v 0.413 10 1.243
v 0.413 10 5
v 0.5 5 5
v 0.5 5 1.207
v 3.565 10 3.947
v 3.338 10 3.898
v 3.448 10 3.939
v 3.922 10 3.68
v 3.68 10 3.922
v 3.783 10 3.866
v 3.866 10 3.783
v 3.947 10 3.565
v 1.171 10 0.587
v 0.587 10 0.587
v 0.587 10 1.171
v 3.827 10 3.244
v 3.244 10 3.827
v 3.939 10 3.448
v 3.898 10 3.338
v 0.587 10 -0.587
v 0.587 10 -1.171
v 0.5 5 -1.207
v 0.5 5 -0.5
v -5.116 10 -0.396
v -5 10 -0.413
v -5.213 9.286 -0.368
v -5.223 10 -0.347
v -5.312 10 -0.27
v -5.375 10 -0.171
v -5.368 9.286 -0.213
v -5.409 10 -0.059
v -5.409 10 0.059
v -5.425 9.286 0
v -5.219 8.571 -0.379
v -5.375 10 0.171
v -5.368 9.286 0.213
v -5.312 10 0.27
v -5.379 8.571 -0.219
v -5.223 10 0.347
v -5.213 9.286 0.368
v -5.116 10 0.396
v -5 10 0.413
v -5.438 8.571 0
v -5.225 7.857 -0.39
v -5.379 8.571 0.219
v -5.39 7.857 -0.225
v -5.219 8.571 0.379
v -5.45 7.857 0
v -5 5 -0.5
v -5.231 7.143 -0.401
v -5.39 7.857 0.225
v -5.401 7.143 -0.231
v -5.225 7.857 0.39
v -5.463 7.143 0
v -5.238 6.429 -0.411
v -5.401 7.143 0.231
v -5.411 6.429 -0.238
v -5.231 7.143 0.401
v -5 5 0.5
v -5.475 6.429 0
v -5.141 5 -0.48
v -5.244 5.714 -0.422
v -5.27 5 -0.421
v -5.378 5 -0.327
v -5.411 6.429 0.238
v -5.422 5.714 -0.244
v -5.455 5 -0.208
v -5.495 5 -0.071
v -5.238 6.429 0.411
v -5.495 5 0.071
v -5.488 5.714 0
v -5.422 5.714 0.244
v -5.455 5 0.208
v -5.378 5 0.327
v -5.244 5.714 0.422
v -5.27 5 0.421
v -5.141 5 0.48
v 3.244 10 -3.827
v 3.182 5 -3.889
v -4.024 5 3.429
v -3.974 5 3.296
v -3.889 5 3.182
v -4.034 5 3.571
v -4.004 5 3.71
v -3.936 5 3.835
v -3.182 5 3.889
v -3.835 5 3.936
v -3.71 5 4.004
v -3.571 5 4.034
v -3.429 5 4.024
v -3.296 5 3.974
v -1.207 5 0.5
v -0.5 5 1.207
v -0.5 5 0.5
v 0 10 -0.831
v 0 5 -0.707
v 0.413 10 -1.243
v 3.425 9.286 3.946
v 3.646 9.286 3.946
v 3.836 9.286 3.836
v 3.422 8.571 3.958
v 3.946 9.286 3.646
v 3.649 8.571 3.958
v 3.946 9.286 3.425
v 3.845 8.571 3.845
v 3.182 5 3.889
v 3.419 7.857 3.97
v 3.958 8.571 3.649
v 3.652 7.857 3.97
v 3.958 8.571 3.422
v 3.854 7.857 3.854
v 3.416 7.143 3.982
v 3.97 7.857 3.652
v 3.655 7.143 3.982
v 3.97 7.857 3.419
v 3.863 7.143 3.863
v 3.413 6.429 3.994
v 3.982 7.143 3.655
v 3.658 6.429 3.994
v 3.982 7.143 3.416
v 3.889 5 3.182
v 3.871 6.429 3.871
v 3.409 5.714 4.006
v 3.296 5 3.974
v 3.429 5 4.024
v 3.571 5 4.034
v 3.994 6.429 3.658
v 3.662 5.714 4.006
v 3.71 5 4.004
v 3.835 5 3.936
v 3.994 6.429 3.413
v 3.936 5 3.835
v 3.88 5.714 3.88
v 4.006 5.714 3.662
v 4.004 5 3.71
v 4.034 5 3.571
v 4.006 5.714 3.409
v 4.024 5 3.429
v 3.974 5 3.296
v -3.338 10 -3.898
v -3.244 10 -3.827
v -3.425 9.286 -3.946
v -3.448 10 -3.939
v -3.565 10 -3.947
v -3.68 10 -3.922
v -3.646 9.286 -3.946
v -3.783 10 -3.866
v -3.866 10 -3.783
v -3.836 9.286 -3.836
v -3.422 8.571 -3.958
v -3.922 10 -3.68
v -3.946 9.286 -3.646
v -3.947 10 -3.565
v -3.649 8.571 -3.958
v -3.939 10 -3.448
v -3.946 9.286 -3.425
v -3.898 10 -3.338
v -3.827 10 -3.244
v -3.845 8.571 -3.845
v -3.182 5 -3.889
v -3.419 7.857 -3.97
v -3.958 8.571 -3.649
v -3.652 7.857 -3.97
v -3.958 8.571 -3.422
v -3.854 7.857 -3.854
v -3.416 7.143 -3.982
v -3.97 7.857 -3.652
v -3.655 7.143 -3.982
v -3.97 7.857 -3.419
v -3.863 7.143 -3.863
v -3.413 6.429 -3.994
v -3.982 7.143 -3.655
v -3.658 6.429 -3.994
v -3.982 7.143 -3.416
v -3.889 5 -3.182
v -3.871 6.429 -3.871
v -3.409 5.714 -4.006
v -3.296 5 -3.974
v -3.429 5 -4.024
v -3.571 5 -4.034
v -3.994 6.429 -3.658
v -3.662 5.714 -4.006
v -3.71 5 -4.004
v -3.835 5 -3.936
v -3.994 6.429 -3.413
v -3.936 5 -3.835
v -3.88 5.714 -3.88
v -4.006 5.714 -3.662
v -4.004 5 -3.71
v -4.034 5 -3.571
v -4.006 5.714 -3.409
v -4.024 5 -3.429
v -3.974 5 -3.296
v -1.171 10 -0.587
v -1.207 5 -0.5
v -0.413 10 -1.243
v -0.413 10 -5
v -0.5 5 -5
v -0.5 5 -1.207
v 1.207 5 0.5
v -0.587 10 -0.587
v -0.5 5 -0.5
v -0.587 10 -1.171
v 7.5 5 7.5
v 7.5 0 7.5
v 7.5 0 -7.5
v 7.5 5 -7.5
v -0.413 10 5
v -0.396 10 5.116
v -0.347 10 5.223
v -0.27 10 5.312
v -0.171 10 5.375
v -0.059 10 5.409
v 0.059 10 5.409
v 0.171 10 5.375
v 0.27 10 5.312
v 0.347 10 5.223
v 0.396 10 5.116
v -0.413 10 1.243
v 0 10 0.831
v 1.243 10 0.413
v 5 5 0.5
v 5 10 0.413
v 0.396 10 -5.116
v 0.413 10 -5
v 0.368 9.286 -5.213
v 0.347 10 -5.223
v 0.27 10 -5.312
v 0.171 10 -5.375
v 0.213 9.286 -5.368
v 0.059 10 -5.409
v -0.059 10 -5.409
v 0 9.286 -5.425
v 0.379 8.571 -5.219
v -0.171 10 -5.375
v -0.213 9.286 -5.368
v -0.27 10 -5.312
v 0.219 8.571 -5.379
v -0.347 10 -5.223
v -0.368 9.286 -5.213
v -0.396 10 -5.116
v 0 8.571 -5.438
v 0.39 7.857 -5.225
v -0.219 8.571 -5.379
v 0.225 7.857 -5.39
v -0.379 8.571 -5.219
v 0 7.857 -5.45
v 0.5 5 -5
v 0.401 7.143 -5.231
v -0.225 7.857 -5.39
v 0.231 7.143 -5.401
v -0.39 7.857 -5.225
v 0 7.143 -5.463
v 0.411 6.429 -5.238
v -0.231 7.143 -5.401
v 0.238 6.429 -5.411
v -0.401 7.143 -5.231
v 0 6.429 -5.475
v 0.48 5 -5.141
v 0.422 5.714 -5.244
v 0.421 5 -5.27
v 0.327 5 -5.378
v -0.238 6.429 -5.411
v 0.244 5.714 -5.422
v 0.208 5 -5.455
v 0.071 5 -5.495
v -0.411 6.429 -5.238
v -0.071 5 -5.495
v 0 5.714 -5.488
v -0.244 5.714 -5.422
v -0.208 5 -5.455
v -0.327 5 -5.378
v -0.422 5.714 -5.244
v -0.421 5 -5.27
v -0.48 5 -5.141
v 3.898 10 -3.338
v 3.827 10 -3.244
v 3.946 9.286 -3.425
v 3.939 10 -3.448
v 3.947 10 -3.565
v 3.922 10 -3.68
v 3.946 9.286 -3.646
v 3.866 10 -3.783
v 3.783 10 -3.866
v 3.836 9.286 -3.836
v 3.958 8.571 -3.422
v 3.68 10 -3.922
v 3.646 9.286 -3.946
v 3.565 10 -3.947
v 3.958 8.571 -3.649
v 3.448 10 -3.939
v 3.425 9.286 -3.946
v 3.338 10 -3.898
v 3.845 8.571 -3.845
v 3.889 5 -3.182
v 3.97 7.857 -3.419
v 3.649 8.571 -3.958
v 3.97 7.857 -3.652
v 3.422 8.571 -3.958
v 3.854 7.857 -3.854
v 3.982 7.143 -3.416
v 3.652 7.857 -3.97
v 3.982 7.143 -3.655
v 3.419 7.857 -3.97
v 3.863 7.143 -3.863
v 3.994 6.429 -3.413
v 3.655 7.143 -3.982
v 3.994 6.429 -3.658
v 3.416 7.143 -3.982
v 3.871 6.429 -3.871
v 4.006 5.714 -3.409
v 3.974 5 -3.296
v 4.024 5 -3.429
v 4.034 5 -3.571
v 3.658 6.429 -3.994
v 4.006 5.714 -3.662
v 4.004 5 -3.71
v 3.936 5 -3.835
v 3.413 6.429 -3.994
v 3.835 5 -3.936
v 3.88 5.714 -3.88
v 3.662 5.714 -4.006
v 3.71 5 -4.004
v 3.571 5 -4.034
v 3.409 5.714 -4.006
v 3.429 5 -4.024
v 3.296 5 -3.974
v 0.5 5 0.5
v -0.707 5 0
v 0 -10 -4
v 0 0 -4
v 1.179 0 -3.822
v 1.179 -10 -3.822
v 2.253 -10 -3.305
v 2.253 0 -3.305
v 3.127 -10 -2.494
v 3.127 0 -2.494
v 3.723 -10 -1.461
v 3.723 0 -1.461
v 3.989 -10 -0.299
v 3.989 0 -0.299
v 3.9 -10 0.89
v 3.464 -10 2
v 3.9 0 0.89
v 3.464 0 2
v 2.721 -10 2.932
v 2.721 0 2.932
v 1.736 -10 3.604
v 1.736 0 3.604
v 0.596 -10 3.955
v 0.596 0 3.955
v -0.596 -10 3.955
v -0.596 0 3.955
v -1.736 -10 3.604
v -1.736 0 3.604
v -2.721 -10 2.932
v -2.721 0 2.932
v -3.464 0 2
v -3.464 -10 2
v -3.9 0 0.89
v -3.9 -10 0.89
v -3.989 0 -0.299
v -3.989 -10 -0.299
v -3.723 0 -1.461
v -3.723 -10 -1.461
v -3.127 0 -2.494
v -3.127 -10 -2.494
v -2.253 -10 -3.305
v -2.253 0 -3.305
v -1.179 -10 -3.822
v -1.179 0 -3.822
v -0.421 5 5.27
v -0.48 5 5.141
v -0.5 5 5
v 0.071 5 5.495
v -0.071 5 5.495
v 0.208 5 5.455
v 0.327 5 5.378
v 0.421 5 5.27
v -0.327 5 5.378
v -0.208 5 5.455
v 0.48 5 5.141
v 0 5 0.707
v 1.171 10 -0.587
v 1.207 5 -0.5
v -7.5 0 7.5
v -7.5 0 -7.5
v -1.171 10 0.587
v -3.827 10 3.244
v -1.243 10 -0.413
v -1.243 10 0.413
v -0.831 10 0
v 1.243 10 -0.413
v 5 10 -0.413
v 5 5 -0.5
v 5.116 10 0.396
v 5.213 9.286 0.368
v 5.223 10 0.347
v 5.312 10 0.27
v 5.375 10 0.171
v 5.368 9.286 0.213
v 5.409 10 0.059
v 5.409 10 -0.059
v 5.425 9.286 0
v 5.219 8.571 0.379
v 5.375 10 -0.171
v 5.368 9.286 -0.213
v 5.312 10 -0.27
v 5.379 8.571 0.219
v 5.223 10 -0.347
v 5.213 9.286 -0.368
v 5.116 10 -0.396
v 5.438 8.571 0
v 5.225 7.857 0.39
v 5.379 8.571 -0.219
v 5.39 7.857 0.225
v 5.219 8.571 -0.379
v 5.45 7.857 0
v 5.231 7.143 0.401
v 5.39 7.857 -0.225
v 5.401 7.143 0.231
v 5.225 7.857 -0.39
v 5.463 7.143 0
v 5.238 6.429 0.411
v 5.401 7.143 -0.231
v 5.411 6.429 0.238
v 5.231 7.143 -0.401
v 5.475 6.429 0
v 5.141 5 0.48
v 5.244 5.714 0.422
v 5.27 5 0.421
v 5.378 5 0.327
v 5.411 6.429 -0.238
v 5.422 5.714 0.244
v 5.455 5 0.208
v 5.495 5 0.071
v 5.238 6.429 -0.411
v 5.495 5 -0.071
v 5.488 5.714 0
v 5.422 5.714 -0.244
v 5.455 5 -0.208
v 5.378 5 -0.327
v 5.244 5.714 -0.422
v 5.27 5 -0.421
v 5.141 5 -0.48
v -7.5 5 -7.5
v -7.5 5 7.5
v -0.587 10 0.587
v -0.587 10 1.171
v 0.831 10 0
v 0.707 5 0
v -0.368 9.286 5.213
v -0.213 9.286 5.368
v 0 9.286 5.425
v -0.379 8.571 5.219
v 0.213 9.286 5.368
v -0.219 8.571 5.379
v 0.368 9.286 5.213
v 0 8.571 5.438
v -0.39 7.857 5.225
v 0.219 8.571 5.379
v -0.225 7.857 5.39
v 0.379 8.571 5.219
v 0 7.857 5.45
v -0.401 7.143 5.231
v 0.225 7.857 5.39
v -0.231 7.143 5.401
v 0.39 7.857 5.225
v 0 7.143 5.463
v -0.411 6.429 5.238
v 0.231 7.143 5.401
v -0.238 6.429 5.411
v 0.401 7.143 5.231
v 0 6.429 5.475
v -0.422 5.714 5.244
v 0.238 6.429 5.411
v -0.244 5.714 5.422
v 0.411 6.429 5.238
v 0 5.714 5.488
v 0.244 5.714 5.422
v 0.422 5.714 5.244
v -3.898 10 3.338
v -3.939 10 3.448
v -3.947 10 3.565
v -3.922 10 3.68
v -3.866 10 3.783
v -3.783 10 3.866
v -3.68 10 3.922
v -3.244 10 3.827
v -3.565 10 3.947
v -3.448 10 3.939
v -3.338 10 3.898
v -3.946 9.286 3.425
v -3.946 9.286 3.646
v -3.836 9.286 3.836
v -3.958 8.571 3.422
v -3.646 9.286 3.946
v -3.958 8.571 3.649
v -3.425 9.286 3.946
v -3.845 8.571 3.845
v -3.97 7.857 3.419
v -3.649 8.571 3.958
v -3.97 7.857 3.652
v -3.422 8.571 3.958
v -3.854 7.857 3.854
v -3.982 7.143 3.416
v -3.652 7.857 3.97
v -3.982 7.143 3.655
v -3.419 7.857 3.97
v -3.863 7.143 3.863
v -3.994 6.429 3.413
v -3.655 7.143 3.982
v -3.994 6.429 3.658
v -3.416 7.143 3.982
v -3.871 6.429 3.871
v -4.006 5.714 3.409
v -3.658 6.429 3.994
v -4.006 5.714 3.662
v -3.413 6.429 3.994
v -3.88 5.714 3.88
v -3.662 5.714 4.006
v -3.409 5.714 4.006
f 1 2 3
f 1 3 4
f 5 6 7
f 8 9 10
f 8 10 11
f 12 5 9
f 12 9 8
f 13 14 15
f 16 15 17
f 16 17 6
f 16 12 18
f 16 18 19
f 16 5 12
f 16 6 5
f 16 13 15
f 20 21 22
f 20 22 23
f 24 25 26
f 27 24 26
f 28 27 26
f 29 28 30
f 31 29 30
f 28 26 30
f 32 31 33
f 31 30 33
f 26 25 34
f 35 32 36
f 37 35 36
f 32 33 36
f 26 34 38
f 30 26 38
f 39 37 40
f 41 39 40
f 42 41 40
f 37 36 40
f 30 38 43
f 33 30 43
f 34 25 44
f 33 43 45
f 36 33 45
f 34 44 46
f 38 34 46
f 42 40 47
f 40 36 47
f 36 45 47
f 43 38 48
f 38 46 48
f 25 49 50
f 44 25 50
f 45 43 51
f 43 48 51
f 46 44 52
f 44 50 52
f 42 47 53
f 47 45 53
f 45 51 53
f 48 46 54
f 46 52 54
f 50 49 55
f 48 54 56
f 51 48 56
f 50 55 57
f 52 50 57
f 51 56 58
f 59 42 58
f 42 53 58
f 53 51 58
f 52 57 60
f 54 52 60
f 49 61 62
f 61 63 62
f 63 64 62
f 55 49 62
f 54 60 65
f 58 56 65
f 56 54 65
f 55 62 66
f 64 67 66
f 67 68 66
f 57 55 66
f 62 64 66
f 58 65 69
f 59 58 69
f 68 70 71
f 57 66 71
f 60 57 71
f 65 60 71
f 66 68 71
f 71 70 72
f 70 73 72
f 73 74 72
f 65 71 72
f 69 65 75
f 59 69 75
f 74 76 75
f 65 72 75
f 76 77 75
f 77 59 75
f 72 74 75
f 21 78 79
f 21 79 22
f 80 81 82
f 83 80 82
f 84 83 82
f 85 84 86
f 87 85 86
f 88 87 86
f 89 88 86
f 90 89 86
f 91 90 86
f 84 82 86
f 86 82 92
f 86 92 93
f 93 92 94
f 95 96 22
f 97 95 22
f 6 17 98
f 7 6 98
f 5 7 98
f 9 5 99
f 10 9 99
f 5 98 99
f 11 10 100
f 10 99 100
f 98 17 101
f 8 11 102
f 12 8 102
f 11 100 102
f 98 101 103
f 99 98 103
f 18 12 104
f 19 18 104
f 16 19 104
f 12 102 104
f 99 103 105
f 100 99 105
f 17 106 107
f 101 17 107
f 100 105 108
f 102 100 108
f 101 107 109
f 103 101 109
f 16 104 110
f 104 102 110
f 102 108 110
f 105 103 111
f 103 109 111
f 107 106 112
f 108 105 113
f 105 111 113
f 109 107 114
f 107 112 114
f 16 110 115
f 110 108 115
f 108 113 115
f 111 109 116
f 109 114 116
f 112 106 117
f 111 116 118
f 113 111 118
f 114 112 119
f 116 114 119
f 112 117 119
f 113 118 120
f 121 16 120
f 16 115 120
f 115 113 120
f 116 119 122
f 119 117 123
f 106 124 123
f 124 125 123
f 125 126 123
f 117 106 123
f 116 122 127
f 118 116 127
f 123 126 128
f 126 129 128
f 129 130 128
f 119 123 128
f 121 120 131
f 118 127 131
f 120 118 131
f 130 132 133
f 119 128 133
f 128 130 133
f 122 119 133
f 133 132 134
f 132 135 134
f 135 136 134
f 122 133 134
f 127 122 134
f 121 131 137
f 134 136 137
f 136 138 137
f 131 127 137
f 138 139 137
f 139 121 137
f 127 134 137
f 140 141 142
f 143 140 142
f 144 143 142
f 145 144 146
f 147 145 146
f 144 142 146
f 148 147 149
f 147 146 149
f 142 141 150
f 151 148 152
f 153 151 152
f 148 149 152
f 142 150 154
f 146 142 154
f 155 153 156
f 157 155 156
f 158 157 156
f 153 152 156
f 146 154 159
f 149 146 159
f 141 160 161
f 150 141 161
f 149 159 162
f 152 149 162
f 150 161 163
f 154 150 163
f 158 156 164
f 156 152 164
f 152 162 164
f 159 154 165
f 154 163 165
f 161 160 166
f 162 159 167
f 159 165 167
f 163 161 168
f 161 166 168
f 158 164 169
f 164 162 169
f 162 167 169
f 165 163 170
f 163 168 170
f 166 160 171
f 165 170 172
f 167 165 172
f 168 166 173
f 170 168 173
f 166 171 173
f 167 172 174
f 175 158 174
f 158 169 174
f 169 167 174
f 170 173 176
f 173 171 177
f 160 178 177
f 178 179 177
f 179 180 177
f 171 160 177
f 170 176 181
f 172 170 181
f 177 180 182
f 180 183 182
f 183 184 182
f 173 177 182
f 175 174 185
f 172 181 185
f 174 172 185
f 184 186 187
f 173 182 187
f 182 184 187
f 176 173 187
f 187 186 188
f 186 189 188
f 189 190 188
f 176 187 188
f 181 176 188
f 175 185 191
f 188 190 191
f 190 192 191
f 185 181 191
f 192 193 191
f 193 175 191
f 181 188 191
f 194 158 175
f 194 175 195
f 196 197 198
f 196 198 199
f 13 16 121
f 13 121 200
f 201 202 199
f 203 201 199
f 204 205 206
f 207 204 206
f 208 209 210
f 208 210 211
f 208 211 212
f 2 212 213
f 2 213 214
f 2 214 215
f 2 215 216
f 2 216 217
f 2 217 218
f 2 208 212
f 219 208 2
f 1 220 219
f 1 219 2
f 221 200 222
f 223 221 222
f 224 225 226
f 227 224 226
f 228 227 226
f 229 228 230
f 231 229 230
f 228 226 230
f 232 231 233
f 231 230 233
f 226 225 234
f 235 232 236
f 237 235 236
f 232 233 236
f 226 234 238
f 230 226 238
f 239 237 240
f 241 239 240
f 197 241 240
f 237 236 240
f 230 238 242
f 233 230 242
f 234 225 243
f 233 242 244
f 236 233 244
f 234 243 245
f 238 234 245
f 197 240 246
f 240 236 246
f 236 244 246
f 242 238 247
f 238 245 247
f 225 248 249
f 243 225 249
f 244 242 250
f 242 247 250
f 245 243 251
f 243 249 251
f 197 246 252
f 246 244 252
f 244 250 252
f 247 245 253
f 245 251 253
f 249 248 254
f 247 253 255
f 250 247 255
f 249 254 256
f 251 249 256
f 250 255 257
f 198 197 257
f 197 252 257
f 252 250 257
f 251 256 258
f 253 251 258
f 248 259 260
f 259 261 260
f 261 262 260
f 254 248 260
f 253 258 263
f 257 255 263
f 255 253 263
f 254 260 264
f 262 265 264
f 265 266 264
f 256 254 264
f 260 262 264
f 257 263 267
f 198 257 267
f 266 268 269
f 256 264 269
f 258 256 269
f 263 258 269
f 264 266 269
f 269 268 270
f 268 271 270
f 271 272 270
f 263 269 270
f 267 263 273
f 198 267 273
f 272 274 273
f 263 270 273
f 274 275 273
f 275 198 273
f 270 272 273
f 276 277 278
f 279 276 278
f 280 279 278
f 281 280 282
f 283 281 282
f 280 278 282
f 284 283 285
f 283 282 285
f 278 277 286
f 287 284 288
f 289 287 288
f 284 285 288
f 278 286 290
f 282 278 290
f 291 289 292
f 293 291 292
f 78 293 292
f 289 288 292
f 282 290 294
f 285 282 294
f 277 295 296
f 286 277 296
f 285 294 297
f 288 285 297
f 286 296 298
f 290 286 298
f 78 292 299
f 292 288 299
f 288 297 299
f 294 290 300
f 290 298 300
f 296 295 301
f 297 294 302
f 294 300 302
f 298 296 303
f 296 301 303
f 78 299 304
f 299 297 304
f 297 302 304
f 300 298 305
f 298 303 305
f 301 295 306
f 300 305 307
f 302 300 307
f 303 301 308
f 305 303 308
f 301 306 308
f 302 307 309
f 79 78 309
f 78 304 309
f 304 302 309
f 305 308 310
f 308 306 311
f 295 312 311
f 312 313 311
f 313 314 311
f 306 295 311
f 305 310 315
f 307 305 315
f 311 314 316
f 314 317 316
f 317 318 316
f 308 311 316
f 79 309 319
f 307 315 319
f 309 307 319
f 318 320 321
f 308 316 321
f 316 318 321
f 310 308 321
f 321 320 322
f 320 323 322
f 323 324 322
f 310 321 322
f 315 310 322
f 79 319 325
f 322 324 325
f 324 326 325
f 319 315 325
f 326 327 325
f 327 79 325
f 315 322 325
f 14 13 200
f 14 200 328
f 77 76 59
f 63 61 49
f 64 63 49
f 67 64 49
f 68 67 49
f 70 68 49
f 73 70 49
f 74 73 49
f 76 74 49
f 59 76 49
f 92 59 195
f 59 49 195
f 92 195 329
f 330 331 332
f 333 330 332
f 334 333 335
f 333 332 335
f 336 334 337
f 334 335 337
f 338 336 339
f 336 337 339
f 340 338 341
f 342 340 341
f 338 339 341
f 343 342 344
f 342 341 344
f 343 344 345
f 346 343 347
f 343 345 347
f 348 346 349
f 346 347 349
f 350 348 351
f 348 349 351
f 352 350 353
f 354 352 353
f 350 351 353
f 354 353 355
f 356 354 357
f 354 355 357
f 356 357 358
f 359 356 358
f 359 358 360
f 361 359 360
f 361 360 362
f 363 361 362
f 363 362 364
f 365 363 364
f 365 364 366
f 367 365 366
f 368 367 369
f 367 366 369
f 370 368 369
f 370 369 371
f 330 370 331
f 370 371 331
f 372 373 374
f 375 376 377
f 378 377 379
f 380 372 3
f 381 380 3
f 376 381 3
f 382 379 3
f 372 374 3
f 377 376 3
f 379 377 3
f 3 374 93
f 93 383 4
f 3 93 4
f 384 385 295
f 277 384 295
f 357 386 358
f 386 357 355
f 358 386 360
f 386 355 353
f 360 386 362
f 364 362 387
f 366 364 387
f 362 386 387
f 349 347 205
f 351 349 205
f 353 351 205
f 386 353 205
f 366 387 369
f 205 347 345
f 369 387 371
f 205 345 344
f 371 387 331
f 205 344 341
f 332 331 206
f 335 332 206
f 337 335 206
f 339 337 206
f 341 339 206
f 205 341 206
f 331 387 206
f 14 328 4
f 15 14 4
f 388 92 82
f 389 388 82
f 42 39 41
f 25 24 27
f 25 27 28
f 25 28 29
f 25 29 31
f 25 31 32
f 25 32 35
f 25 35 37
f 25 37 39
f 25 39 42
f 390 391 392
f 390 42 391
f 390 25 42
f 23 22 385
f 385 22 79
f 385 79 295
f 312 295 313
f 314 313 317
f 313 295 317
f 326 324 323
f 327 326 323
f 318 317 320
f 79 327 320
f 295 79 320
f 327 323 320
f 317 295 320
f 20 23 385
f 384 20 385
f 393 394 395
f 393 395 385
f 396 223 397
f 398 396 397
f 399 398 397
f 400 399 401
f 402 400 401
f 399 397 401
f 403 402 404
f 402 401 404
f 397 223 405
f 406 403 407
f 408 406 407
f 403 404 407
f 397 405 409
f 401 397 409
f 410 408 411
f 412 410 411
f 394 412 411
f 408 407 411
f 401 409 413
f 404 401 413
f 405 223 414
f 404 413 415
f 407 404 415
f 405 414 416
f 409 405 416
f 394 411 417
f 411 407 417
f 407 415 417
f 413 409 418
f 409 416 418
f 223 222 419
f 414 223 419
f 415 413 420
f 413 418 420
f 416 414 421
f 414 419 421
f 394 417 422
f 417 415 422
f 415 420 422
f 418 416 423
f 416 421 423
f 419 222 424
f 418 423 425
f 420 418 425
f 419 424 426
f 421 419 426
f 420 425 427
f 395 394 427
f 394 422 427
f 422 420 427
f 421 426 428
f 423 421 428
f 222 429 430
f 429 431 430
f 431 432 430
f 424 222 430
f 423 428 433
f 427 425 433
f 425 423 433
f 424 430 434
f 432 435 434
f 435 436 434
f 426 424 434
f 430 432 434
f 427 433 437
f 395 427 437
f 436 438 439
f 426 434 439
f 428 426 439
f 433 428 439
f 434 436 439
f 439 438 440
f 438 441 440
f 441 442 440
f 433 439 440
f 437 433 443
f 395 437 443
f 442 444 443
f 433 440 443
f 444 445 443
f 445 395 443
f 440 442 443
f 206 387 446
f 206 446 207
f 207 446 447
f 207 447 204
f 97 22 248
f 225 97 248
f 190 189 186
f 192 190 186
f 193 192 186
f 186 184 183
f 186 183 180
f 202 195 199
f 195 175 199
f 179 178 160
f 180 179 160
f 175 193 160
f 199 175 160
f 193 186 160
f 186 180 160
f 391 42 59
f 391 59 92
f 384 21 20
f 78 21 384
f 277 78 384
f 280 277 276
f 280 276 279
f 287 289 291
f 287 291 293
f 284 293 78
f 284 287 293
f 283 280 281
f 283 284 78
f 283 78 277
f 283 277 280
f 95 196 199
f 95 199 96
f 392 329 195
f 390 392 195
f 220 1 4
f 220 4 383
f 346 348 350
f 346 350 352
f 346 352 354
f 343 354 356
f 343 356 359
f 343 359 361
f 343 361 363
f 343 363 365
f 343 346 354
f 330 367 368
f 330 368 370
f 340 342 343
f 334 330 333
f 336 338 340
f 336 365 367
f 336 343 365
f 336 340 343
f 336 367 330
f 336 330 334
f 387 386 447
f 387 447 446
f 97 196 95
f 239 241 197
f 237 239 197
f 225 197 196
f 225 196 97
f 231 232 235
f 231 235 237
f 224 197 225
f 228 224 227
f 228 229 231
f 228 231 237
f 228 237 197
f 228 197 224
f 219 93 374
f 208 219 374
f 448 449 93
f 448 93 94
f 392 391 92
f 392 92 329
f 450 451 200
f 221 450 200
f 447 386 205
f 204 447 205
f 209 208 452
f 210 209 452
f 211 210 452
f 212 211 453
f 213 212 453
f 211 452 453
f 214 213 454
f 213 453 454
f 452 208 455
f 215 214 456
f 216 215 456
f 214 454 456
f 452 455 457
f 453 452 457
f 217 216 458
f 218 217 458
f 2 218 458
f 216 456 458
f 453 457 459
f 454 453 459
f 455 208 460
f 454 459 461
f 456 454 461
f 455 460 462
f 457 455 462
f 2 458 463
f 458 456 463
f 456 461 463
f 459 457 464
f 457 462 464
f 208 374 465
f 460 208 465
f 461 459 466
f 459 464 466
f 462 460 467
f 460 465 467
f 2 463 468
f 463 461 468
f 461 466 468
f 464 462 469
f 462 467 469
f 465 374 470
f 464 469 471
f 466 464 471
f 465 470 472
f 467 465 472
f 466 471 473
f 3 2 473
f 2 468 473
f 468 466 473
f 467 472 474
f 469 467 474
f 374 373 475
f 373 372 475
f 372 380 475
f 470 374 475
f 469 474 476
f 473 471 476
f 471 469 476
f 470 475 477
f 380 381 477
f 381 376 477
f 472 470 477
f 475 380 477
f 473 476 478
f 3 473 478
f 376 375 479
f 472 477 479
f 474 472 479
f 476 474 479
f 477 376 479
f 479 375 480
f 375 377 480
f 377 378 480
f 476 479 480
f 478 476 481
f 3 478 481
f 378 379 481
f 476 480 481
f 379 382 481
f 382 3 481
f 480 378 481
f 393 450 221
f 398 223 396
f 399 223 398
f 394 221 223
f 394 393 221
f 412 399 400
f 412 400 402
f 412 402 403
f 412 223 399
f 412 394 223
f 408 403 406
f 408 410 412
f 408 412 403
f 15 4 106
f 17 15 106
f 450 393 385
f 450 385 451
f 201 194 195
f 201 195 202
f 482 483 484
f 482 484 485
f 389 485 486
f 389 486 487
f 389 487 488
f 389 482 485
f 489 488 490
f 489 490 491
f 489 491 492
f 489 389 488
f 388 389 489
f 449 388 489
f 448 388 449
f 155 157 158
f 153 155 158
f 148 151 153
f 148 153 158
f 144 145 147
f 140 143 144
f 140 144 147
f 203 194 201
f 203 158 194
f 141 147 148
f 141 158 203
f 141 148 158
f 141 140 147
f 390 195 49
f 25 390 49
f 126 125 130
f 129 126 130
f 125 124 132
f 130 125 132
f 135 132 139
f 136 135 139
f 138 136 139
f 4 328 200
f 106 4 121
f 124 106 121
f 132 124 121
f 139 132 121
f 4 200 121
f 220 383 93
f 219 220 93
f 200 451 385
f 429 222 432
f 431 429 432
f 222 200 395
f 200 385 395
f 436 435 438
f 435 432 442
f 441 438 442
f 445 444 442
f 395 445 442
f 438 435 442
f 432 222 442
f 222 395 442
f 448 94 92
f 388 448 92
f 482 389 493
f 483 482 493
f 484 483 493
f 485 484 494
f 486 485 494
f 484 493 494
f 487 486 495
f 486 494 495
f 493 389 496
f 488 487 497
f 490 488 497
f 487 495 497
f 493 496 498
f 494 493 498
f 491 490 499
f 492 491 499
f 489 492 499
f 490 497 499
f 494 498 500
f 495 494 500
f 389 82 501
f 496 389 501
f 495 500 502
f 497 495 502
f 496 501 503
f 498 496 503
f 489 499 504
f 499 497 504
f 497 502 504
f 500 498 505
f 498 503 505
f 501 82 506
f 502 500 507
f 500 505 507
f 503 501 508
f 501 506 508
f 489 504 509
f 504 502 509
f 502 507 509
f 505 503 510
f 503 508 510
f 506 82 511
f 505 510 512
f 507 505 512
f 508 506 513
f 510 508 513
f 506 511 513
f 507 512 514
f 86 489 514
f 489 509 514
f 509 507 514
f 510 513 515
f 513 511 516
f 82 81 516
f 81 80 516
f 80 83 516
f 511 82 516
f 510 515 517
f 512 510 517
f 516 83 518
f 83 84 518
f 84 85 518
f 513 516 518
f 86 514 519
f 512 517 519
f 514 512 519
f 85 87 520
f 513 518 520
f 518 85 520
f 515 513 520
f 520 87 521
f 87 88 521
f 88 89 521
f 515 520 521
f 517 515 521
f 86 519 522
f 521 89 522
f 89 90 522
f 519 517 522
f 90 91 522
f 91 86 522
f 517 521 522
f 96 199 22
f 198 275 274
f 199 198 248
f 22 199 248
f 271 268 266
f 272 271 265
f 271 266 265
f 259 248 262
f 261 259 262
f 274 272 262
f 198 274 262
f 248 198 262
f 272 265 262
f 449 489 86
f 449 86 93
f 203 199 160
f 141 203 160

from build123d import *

# Parameters (mm, degrees)
SKETCH1_W                     = 15
SKETCH1_H                     = 15
BOSS_EXTRUDE1_DEPTH           = 5
BOSS_EXTRUDE2_DEPTH           = 5
BOSS_EXTRUDE2_DRAFT           = 1
BOSS_EXTRUDE2_PROFILE_2_DEPTH = 5
BOSS_EXTRUDE2_PROFILE_2_DRAFT = 1
BOSS_EXTRUDE2_PROFILE_3_DEPTH = 5
BOSS_EXTRUDE2_PROFILE_3_DRAFT = 1
BOSS_EXTRUDE2_PROFILE_4_DEPTH = 5
BOSS_EXTRUDE2_PROFILE_4_DRAFT = 1
BOSS_EXTRUDE2_PROFILE_5_DEPTH = 5
BOSS_EXTRUDE2_PROFILE_5_DRAFT = 1
BOSS_EXTRUDE2_PROFILE_6_DEPTH = 5
BOSS_EXTRUDE2_PROFILE_6_DRAFT = 1
BOSS_EXTRUDE2_PROFILE_7_DEPTH = 5
BOSS_EXTRUDE2_PROFILE_7_DRAFT = 1
BOSS_EXTRUDE2_PROFILE_8_DEPTH = 5
BOSS_EXTRUDE2_PROFILE_8_DRAFT = 1
SKETCH3_R                     = 4
BOSS_EXTRUDE3_DEPTH           = 10


with BuildPart() as part:
    # Sketch1 → Boss-Extrude1 (new body)
    with BuildSketch(Plane(origin=(0, 0, 0), x_dir=(1, 0, 0), z_dir=(0, 1, 0))):
        Rectangle(SKETCH1_W, SKETCH1_H)
    extrude(amount=BOSS_EXTRUDE1_DEPTH)

    # Sketch3 → Boss-Extrude3 (add)
    with BuildSketch(Plane.XZ):
        with Locations(Location((0, 0, 0), (0, 0, 270))):
            Circle(SKETCH3_R)
    extrude(amount=BOSS_EXTRUDE3_DEPTH)


with BuildPart() as body_2:
    # Sketch2 → Boss-Extrude2 (with draft: the straight prism first)
    with BuildSketch(Plane(origin=(0, 5, 0), x_dir=(1, 0, 0), z_dir=(0, 1, 0))):
        with BuildLine():
            Line((-0.5, 5), (-0.5, 1.207106781))
            Line((-0.5, 1.207106781), (0, 0.707106781))
            Line((0, 0.707106781), (0.5, 1.207106781))
            Line((0.5, 1.207106781), (0.5, 5))
            ThreePointArc((0.5, 5), (0, 5.5), (-0.5, 5))
        make_face()
    extrude(amount=BOSS_EXTRUDE2_DEPTH)
    # Boss-Extrude2: the draft: its side faces are tilted about the plane it starts from
    boss_extrude2_sides = [body_2.faces().sort_by_distance(p)[0] for p in [
        (0.5, 7.5, -3.103553391),
        (0, 7.5, -5.5),
        (-0.5, 7.5, -3.103553391),
        (-0.25, 7.5, -0.957106781),
        (0.25, 7.5, -0.957106781),
    ]]
    draft(boss_extrude2_sides, Plane(origin=(0, 5, 0), x_dir=(1, 0, 0), z_dir=(0, 1, 0)), BOSS_EXTRUDE2_DRAFT)


with BuildPart() as body_3:
    # Sketch2 → Boss-Extrude2 profile 2 (with draft: the straight prism first)
    with BuildSketch(Plane(origin=(0, 5, 0), x_dir=(1, 0, 0), z_dir=(0, 1, 0))):
        with BuildLine():
            Line((3.181980515, 3.889087297), (0.5, 1.207106781))
            Line((0.5, 1.207106781), (0.5, 0.5))
            Line((0.5, 0.5), (1.207106781, 0.5))
            Line((1.207106781, 0.5), (3.889087297, 3.181980515))
            ThreePointArc((3.889087297, 3.181980515), (3.889087297, 3.889087297), (3.181980515, 3.889087297))
        make_face()
    extrude(amount=BOSS_EXTRUDE2_PROFILE_2_DEPTH)
    # Boss-Extrude2 profile 2: the draft: its side faces are tilted about the plane it starts from
    boss_extrude2_profile_2_sides = [body_3.faces().sort_by_distance(p)[0] for p in [
        (2.548097039, 7.5, -1.840990258),
        (3.889087297, 7.5, -3.889087297),
        (1.840990258, 7.5, -2.548097039),
        (0.5, 7.5, -0.853553391),
        (0.853553391, 7.5, -0.5),
    ]]
    draft(boss_extrude2_profile_2_sides, Plane(origin=(0, 5, 0), x_dir=(1, 0, 0), z_dir=(0, 1, 0)), BOSS_EXTRUDE2_PROFILE_2_DRAFT)


with BuildPart() as body_4:
    # Sketch2 → Boss-Extrude2 profile 3 (with draft: the straight prism first)
    with BuildSketch(Plane(origin=(0, 5, 0), x_dir=(1, 0, 0), z_dir=(0, 1, 0))):
        with BuildLine():
            Line((1.207106781, 0.5), (0.707106781, 0))
            Line((0.707106781, 0), (1.207106781, -0.5))
            Line((1.207106781, -0.5), (5, -0.5))
            ThreePointArc((5, -0.5), (5.5, 0), (5, 0.5))
            Line((5, 0.5), (1.207106781, 0.5))
        make_face()
    extrude(amount=BOSS_EXTRUDE2_PROFILE_3_DEPTH)
    # Boss-Extrude2 profile 3: the draft: its side faces are tilted about the plane it starts from
    boss_extrude2_profile_3_sides = [body_4.faces().sort_by_distance(p)[0] for p in [
        (0.957106781, 7.5, -0.25),
        (0.957106781, 7.5, 0.25),
        (3.103553391, 7.5, 0.5),
        (5.5, 7.5, 0),
        (3.103553391, 7.5, -0.5),
    ]]
    draft(boss_extrude2_profile_3_sides, Plane(origin=(0, 5, 0), x_dir=(1, 0, 0), z_dir=(0, 1, 0)), BOSS_EXTRUDE2_PROFILE_3_DRAFT)


with BuildPart() as body_5:
    # Sketch2 → Boss-Extrude2 profile 4 (with draft: the straight prism first)
    with BuildSketch(Plane(origin=(0, 5, 0), x_dir=(1, 0, 0), z_dir=(0, 1, 0))):
        with BuildLine():
            Line((1.207106781, -0.5), (0.5, -0.5))
            Line((0.5, -0.5), (0.5, -1.207106781))
            Line((0.5, -1.207106781), (3.181980515, -3.889087297))
            ThreePointArc((3.181980515, -3.889087297), (3.889087297, -3.889087297), (3.889087297, -3.181980515))
            Line((3.889087297, -3.181980515), (1.207106781, -0.5))
        make_face()
    extrude(amount=BOSS_EXTRUDE2_PROFILE_4_DEPTH)
    # Boss-Extrude2 profile 4: the draft: its side faces are tilted about the plane it starts from
    boss_extrude2_profile_4_sides = [body_5.faces().sort_by_distance(p)[0] for p in [
        (0.853553391, 7.5, 0.5),
        (0.5, 7.5, 0.853553391),
        (1.840990258, 7.5, 2.548097039),
        (3.889087297, 7.5, 3.889087297),
        (2.548097039, 7.5, 1.840990258),
    ]]
    draft(boss_extrude2_profile_4_sides, Plane(origin=(0, 5, 0), x_dir=(1, 0, 0), z_dir=(0, 1, 0)), BOSS_EXTRUDE2_PROFILE_4_DRAFT)


with BuildPart() as body_6:
    # Sketch2 → Boss-Extrude2 profile 5 (with draft: the straight prism first)
    with BuildSketch(Plane(origin=(0, 5, 0), x_dir=(1, 0, 0), z_dir=(0, 1, 0))):
        with BuildLine():
            Line((0, -0.707106781), (-0.5, -1.207106781))
            Line((-0.5, -1.207106781), (-0.5, -5))
            ThreePointArc((-0.5, -5), (0, -5.5), (0.5, -5))
            Line((0.5, -5), (0.5, -1.207106781))
            Line((0.5, -1.207106781), (0, -0.707106781))
        make_face()
    extrude(amount=BOSS_EXTRUDE2_PROFILE_5_DEPTH)
    # Boss-Extrude2 profile 5: the draft: its side faces are tilted about the plane it starts from
    boss_extrude2_profile_5_sides = [body_6.faces().sort_by_distance(p)[0] for p in [
        (0.25, 7.5, 0.957106781),
        (-0.25, 7.5, 0.957106781),
        (-0.5, 7.5, 3.103553391),
        (0, 7.5, 5.5),
        (0.5, 7.5, 3.103553391),
    ]]
    draft(boss_extrude2_profile_5_sides, Plane(origin=(0, 5, 0), x_dir=(1, 0, 0), z_dir=(0, 1, 0)), BOSS_EXTRUDE2_PROFILE_5_DRAFT)


with BuildPart() as body_7:
    # Sketch2 → Boss-Extrude2 profile 6 (with draft: the straight prism first)
    with BuildSketch(Plane(origin=(0, 5, 0), x_dir=(1, 0, 0), z_dir=(0, 1, 0))):
        with BuildLine():
            Line((-0.5, -1.207106781), (-0.5, -0.5))
            Line((-0.5, -0.5), (-1.207106781, -0.5))
            Line((-1.207106781, -0.5), (-3.889087297, -3.181980515))
            ThreePointArc((-3.889087297, -3.181980515), (-3.889087297, -3.889087297), (-3.181980515, -3.889087297))
            Line((-3.181980515, -3.889087297), (-0.5, -1.207106781))
        make_face()
    extrude(amount=BOSS_EXTRUDE2_PROFILE_6_DEPTH)
    # Boss-Extrude2 profile 6: the draft: its side faces are tilted about the plane it starts from
    boss_extrude2_profile_6_sides = [body_7.faces().sort_by_distance(p)[0] for p in [
        (-0.5, 7.5, 0.853553391),
        (-0.853553391, 7.5, 0.5),
        (-2.548097039, 7.5, 1.840990258),
        (-3.889087297, 7.5, 3.889087297),
        (-1.840990258, 7.5, 2.548097039),
    ]]
    draft(boss_extrude2_profile_6_sides, Plane(origin=(0, 5, 0), x_dir=(1, 0, 0), z_dir=(0, 1, 0)), BOSS_EXTRUDE2_PROFILE_6_DRAFT)


with BuildPart() as body_8:
    # Sketch2 → Boss-Extrude2 profile 7 (with draft: the straight prism first)
    with BuildSketch(Plane(origin=(0, 5, 0), x_dir=(1, 0, 0), z_dir=(0, 1, 0))):
        with BuildLine():
            Line((-1.207106781, -0.5), (-0.707106781, 0))
            Line((-0.707106781, 0), (-1.207106781, 0.5))
            Line((-1.207106781, 0.5), (-5, 0.5))
            ThreePointArc((-5, 0.5), (-5.5, 0), (-5, -0.5))
            Line((-5, -0.5), (-1.207106781, -0.5))
        make_face()
    extrude(amount=BOSS_EXTRUDE2_PROFILE_7_DEPTH)
    # Boss-Extrude2 profile 7: the draft: its side faces are tilted about the plane it starts from
    boss_extrude2_profile_7_sides = [body_8.faces().sort_by_distance(p)[0] for p in [
        (-5.5, 7.5, 0),
        (-3.103553391, 7.5, 0.5),
        (-0.957106781, 7.5, 0.25),
        (-0.957106781, 7.5, -0.25),
        (-3.103553391, 7.5, -0.5),
    ]]
    draft(boss_extrude2_profile_7_sides, Plane(origin=(0, 5, 0), x_dir=(1, 0, 0), z_dir=(0, 1, 0)), BOSS_EXTRUDE2_PROFILE_7_DRAFT)


with BuildPart() as body_9:
    # Sketch2 → Boss-Extrude2 profile 8 (with draft: the straight prism first)
    with BuildSketch(Plane(origin=(0, 5, 0), x_dir=(1, 0, 0), z_dir=(0, 1, 0))):
        with BuildLine():
            Line((-1.207106781, 0.5), (-0.5, 0.5))
            Line((-0.5, 0.5), (-0.5, 1.207106781))
            Line((-0.5, 1.207106781), (-3.181980515, 3.889087297))
            ThreePointArc((-3.181980515, 3.889087297), (-3.889087297, 3.889087297), (-3.889087297, 3.181980515))
            Line((-3.889087297, 3.181980515), (-1.207106781, 0.5))
        make_face()
    extrude(amount=BOSS_EXTRUDE2_PROFILE_8_DEPTH)
    # Boss-Extrude2 profile 8: the draft: its side faces are tilted about the plane it starts from
    boss_extrude2_profile_8_sides = [body_9.faces().sort_by_distance(p)[0] for p in [
        (-0.853553391, 7.5, -0.5),
        (-0.5, 7.5, -0.853553391),
        (-1.840990258, 7.5, -2.548097039),
        (-3.889087297, 7.5, -3.889087297),
        (-2.548097039, 7.5, -1.840990258),
    ]]
    draft(boss_extrude2_profile_8_sides, Plane(origin=(0, 5, 0), x_dir=(1, 0, 0), z_dir=(0, 1, 0)), BOSS_EXTRUDE2_PROFILE_8_DRAFT)


solid = Compound([part.part, body_2.part, body_3.part, body_4.part, body_5.part, body_6.part, body_7.part, body_8.part, body_9.part])
